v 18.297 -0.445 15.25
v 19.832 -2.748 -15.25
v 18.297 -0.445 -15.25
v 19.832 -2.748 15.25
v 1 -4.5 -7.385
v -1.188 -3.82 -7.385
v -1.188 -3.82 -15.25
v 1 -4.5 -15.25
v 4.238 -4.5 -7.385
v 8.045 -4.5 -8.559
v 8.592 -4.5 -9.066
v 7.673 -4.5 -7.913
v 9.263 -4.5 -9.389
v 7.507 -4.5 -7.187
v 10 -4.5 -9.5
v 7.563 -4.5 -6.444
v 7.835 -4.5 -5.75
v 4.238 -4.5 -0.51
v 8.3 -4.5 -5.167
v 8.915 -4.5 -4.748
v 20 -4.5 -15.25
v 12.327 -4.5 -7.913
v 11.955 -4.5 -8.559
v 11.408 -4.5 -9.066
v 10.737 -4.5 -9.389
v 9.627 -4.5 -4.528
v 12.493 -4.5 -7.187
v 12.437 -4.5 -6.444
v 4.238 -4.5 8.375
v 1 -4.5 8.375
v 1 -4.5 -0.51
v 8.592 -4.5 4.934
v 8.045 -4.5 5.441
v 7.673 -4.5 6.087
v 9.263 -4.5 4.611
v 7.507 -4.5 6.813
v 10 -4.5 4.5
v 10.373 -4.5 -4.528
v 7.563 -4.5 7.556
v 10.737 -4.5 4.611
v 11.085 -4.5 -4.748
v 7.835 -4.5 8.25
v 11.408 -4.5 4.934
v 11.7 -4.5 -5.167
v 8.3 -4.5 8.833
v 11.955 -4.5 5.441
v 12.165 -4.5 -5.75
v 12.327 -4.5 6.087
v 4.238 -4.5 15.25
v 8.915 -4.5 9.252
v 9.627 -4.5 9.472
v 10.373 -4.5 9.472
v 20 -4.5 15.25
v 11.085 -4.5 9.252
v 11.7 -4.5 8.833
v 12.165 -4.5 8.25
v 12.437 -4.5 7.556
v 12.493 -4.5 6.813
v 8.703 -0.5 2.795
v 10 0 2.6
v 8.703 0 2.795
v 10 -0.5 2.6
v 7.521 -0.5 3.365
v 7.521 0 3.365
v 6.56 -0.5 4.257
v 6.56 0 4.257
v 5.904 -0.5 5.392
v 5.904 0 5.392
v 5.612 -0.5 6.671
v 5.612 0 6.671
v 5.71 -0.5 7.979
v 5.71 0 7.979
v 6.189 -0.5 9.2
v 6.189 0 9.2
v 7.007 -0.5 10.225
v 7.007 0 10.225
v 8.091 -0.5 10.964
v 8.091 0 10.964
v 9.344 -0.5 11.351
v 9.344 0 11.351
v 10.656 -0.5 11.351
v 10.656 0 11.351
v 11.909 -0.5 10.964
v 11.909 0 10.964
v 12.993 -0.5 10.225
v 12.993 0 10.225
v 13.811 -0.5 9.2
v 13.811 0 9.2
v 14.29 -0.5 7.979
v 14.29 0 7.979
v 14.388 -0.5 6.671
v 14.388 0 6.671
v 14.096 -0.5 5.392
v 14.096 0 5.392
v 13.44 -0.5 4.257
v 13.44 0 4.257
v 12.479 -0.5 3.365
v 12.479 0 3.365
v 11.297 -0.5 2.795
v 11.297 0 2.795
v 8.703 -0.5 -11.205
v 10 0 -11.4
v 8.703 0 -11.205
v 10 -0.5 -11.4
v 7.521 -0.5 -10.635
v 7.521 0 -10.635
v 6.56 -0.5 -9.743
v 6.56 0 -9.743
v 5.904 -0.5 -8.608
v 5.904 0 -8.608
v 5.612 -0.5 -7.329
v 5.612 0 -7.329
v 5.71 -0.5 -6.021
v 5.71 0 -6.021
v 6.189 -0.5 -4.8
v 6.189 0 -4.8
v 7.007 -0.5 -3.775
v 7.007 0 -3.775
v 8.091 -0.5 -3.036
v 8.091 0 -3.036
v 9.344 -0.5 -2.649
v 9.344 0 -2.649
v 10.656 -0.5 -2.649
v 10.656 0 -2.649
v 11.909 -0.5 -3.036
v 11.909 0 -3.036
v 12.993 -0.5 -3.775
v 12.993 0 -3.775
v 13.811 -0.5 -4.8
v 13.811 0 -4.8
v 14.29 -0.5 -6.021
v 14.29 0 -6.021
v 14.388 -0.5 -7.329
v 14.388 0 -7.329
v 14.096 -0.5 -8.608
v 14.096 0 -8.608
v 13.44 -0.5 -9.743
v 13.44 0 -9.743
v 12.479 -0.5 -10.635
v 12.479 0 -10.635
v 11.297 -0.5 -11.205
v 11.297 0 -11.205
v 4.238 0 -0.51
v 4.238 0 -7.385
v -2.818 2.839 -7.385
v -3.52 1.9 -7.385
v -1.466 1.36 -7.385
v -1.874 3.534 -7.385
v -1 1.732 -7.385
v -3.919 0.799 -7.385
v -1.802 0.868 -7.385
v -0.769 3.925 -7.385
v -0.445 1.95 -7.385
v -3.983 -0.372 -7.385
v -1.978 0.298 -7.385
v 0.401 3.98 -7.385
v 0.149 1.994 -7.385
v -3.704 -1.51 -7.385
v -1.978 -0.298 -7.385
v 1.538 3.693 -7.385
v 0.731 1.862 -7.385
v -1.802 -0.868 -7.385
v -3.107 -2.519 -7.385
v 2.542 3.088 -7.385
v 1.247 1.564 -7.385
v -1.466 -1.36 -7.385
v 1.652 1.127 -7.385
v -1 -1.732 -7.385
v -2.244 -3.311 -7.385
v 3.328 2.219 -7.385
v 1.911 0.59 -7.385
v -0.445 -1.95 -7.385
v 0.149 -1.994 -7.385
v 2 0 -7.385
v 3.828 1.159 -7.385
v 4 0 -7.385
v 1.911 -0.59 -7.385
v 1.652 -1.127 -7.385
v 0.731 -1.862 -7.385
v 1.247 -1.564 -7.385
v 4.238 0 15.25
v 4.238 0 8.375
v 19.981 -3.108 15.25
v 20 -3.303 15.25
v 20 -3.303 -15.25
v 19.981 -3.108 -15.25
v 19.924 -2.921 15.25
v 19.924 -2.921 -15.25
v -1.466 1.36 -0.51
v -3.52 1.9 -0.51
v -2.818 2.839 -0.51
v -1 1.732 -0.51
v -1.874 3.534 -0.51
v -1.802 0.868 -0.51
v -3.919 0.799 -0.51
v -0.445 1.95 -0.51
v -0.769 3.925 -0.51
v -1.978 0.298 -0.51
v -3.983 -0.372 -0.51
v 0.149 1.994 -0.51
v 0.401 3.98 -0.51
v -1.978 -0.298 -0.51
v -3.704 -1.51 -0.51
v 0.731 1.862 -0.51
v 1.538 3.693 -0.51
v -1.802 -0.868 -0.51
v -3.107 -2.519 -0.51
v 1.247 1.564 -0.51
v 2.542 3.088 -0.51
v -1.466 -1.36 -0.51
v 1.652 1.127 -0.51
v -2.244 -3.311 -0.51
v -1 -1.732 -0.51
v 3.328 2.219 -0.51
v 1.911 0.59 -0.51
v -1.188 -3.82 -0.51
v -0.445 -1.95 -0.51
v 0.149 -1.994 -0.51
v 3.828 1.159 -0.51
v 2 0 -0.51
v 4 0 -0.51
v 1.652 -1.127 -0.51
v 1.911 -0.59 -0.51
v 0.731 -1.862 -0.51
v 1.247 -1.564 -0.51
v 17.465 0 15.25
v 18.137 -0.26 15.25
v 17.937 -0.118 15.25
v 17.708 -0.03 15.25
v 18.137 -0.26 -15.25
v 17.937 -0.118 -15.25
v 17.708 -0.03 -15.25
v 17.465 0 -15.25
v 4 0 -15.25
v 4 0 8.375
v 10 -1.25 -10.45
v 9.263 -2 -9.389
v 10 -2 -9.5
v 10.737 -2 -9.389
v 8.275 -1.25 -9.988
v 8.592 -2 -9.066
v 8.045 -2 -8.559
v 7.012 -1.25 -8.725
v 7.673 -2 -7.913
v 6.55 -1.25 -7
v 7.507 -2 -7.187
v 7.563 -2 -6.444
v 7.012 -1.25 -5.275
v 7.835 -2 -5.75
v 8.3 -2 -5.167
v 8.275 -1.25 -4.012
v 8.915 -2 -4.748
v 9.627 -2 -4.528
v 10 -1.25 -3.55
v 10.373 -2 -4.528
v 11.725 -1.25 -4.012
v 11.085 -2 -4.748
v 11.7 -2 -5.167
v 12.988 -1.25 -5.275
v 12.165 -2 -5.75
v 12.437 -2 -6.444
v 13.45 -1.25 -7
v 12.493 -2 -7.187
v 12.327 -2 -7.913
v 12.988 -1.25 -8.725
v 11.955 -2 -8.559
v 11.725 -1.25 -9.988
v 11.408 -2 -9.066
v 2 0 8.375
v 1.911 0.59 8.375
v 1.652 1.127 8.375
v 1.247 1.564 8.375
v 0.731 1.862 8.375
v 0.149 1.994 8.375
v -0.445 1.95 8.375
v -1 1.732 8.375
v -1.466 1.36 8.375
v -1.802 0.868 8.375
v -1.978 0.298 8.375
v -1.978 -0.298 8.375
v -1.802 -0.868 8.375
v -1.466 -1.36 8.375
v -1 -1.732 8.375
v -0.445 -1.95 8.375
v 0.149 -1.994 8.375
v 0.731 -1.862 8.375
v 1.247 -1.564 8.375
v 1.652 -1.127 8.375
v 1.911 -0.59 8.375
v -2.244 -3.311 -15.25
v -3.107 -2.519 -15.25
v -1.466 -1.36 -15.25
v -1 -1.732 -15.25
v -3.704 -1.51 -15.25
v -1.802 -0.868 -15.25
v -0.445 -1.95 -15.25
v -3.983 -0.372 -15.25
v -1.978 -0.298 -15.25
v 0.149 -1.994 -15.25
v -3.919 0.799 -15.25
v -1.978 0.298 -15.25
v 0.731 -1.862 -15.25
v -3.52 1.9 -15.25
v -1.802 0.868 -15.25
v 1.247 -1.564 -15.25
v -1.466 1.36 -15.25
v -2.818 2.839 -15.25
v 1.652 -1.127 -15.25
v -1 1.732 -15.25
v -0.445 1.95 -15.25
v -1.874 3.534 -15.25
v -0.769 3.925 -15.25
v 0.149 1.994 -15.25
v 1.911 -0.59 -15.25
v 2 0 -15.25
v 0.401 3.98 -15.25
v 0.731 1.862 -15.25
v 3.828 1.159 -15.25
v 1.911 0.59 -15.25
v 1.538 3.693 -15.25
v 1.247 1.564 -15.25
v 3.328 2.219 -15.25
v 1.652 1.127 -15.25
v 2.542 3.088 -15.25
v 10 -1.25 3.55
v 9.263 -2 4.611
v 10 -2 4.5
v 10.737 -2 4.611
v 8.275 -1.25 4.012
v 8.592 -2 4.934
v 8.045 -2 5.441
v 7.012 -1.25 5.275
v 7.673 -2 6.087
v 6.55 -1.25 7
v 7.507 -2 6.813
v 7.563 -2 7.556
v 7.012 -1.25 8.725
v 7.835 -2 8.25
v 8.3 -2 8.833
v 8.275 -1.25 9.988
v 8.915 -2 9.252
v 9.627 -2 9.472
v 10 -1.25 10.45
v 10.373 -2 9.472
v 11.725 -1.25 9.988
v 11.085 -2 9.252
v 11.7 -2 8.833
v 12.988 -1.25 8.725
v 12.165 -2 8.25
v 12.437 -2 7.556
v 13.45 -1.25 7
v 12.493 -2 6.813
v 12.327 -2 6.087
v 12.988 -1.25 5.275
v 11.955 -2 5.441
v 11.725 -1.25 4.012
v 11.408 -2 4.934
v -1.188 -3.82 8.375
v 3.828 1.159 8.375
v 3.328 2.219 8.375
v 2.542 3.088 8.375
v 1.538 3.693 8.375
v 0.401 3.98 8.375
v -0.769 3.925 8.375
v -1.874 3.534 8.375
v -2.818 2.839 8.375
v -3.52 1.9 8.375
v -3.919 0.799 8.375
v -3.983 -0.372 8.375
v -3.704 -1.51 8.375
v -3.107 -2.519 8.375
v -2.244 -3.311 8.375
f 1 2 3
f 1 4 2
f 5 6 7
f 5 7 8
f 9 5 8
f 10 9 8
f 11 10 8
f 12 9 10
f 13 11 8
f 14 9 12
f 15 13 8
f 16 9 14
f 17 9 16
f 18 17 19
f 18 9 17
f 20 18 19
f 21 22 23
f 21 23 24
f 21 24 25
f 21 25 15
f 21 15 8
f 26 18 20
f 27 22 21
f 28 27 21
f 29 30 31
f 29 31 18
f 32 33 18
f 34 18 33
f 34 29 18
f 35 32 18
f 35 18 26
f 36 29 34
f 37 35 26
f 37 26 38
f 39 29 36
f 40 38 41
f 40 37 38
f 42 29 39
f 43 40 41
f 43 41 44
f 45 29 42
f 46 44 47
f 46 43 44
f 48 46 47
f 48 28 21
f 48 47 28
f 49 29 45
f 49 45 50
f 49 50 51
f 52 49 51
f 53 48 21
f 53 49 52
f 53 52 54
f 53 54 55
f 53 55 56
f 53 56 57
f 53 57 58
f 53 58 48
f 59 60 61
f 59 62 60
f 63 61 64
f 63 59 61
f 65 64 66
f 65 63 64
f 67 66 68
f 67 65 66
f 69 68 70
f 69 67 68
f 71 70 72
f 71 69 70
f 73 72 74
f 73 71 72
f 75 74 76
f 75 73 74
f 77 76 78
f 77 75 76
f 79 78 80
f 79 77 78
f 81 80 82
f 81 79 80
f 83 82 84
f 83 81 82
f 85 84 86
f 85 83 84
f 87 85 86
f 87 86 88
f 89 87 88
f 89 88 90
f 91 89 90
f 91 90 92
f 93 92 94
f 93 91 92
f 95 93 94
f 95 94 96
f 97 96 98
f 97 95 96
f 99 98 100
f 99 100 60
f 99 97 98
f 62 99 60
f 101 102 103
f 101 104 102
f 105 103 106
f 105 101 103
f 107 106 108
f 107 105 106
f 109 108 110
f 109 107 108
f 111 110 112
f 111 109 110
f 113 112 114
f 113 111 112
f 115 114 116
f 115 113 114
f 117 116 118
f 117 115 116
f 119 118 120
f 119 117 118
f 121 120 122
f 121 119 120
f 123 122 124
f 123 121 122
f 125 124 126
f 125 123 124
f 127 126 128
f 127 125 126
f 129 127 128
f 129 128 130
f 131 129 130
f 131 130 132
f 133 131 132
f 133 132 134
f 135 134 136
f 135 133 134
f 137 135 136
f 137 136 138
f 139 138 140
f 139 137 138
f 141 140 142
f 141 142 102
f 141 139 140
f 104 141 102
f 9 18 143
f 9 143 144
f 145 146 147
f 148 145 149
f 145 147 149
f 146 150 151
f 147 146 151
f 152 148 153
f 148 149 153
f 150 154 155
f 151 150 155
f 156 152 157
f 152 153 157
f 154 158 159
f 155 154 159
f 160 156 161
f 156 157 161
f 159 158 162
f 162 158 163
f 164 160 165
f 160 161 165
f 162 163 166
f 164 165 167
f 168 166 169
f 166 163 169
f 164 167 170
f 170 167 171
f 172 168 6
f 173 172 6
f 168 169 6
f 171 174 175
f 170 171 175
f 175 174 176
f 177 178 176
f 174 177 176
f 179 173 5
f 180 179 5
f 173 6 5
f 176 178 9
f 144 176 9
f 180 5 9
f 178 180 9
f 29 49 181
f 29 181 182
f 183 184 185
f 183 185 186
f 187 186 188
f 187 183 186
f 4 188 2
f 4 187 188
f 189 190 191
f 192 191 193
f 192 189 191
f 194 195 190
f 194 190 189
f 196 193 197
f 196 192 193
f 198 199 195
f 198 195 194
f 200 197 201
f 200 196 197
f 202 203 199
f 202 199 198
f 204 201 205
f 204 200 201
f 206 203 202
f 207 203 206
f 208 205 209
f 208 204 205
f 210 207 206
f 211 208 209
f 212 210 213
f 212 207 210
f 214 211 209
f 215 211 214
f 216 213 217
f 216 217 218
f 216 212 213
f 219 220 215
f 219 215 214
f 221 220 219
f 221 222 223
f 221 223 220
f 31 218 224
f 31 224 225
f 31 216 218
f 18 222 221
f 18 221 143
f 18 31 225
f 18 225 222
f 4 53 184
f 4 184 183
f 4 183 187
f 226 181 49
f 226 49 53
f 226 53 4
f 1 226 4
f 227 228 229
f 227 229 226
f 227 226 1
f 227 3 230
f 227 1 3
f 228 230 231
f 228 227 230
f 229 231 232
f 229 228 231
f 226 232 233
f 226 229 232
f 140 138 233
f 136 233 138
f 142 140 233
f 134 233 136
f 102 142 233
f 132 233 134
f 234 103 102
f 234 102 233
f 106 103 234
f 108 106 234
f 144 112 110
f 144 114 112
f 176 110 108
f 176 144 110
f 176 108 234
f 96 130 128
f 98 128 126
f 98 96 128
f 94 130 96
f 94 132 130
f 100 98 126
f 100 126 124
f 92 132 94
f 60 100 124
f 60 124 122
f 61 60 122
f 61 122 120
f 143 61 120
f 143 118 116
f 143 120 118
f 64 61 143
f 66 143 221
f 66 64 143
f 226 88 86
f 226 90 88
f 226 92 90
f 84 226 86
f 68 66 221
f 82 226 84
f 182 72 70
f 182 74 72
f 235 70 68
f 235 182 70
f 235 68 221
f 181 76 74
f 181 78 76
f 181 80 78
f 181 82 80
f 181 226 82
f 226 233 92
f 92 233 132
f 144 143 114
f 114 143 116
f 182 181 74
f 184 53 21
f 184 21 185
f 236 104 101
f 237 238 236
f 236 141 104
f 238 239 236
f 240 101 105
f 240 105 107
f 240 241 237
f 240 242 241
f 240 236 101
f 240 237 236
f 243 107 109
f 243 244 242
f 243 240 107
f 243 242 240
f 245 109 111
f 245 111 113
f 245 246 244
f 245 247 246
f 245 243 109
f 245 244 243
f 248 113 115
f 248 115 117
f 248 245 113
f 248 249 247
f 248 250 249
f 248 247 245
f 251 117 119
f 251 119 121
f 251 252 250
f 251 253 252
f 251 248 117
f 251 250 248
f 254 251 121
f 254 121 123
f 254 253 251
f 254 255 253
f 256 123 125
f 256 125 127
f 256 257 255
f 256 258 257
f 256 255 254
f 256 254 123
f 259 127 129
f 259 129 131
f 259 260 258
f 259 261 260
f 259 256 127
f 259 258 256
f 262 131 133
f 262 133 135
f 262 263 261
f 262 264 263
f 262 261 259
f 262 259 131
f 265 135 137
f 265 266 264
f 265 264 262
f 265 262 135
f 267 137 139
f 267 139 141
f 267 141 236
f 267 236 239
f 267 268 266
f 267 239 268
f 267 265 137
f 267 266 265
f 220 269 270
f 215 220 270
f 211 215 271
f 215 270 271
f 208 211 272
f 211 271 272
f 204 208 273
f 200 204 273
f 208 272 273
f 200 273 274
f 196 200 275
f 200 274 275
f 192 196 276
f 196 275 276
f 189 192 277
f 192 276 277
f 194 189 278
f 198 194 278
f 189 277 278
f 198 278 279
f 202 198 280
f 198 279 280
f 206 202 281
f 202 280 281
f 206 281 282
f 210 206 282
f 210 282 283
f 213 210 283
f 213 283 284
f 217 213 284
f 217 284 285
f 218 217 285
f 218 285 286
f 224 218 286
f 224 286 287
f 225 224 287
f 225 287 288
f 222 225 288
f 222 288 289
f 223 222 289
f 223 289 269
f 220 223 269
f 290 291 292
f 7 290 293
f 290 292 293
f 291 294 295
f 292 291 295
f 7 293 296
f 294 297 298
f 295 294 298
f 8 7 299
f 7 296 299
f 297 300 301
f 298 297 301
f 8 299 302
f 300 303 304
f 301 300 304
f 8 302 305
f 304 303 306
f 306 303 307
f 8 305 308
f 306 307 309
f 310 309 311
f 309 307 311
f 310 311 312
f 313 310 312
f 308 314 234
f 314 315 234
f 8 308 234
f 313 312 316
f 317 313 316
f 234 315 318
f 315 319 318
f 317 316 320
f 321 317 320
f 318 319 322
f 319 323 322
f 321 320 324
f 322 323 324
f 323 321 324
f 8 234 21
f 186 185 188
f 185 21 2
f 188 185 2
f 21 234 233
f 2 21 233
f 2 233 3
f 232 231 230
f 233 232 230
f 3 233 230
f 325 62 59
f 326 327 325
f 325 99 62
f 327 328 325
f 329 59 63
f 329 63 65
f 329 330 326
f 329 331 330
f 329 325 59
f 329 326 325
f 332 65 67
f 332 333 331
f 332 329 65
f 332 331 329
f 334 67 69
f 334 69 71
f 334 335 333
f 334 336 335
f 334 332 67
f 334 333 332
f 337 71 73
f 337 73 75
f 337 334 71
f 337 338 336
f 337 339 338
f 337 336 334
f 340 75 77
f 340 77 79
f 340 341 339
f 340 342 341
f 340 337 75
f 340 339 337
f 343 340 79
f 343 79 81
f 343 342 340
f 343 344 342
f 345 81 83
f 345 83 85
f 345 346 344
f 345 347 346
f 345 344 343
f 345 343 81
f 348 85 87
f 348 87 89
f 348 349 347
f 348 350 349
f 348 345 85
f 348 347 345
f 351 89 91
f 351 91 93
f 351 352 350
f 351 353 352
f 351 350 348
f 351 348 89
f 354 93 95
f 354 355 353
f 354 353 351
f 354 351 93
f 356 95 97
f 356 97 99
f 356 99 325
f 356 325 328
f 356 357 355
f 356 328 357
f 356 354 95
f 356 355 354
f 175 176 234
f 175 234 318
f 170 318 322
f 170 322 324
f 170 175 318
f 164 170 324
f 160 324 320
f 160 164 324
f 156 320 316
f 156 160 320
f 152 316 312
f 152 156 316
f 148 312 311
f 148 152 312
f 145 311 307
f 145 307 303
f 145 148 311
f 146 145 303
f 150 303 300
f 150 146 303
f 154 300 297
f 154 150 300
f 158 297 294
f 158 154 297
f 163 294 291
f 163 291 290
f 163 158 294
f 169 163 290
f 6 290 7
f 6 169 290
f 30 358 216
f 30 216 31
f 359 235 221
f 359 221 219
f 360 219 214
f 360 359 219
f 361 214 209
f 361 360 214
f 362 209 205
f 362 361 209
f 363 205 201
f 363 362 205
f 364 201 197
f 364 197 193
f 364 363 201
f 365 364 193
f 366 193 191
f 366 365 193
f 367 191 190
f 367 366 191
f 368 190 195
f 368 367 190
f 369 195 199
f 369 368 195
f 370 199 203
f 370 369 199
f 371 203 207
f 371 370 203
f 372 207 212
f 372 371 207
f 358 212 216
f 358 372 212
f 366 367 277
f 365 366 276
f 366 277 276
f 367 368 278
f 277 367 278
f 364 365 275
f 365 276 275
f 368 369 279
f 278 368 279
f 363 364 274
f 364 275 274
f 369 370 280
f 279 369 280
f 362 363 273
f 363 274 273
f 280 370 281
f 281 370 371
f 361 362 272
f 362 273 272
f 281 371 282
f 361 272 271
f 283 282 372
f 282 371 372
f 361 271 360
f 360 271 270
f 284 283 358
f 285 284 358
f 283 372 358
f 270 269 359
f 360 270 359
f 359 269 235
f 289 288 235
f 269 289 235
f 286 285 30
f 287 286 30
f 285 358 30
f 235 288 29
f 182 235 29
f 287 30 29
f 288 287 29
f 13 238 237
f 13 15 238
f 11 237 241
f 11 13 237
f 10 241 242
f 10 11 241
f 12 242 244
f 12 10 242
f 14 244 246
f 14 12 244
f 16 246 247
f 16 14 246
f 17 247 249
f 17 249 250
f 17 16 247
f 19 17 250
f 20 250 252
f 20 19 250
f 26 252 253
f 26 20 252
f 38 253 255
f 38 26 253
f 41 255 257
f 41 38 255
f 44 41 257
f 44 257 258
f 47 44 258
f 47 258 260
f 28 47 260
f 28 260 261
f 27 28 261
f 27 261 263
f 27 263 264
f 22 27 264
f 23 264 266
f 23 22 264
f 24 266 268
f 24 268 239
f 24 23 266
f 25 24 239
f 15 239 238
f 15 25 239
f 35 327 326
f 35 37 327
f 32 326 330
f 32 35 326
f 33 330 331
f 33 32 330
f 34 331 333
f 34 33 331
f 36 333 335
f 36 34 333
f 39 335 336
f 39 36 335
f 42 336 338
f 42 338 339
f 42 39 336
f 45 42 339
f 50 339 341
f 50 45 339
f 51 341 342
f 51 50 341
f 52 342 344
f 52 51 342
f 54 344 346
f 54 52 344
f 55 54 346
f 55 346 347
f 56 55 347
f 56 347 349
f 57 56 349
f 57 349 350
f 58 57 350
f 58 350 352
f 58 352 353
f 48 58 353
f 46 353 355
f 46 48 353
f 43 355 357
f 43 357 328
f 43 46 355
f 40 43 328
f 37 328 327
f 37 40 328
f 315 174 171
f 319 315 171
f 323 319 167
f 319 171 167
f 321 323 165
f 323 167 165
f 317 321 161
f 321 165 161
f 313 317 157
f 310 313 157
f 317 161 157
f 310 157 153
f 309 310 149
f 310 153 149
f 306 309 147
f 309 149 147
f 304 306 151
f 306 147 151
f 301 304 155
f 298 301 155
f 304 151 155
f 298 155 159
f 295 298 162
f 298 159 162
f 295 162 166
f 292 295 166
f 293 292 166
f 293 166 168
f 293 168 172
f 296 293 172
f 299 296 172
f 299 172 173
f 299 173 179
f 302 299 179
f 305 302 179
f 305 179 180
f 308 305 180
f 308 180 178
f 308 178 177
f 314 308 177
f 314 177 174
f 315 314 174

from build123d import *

# Parameters (mm, degrees)
EXTRUDE_1_DEPTH          = 15.25
CUT_EXTRUDE_1_DEPTH      = 26.550195694
CUT_EXTRUDE_1_DEPTH_BACK = 26.550195694
SKETCH_3_W               = 8.238165393
SKETCH_3_H               = 6.875
SKETCH_4_R               = 2
CUT_EXTRUDE_2_DEPTH      = 32.279236324
PATTERN_LINEAR_1_COUNT   = 2
PATTERN_LINEAR_1_PITCH   = 14


with BuildPart() as part:
    # 草图1 → 凸台-拉伸1 (new, symmetric)
    with BuildSketch(Plane.XY):
        with BuildLine():
            Line((17.464816242, 0), (4, 0))
            ThreePointArc((4, 0), (-2.371533507, 3.221153338), (-1.187914412, -3.819536536))
            Line((-1.187914412, -3.819536536), (1, -4.5))
            Line((1, -4.5), (20, -4.5))
            Line((20, -4.5), (20, -3.302775638))
            ThreePointArc((20, -3.302775638), (19.957092026, -3.012991489), (19.832050294, -2.748075442))
            Line((19.832050294, -2.748075442), (18.296866536, -0.445299804))
            ThreePointArc((18.296866536, -0.445299804), (17.936674167, -0.118325401), (17.464816242, 0))
        make_face()
    extrude(amount=EXTRUDE_1_DEPTH, both=True)

    # 草图3 → 切除-拉伸1 (cut, two sides: drawn at the far end of the back side and taken through both)
    with BuildSketch(Plane(origin=(0, 0, 0), x_dir=(1, 0, 0), z_dir=(0, 1, 0)).offset(-CUT_EXTRUDE_1_DEPTH_BACK)):
        with Locations((0.119082697, -11.8125)):
            Rectangle(SKETCH_3_W, SKETCH_3_H)
        with Locations((0.119082697, 3.9475)):
            Rectangle(SKETCH_3_W, SKETCH_3_H)
    extrude(amount=CUT_EXTRUDE_1_DEPTH + CUT_EXTRUDE_1_DEPTH_BACK, mode=Mode.SUBTRACT)

    # 草图4 → 切除-拉伸2 (cut, through all)
    with BuildSketch(Plane.XY.offset(8.375)):
        Circle(SKETCH_4_R)
    extrude(amount=-CUT_EXTRUDE_2_DEPTH, mode=Mode.SUBTRACT)

    # 草图5 → 切除-旋转1 (revolve, cut)
    with BuildSketch(Plane.XY.offset(7), mode=Mode.PRIVATE) as cut_revolve_1_sk:
        Polygon((10, -4.5), (10, 0), (14.4, 0), (14.4, -0.5), (12.5, -2), (12.5, -4.5), align=None)
    cut_revolve_1 = revolve(cut_revolve_1_sk.sketch.rotate(Axis((10, -4.5, 7), (0, 1, 0)), 90), axis=Axis((10, -4.5, 7), (0, 1, 0)), mode=Mode.SUBTRACT)

    # 阵列(线性)1: 切除-旋转1 ×2
    with Locations(*[(0, 0, -i * PATTERN_LINEAR_1_PITCH) for i in range(1, PATTERN_LINEAR_1_COUNT)]):
        add(cut_revolve_1, mode=Mode.SUBTRACT)


solid = part.part
